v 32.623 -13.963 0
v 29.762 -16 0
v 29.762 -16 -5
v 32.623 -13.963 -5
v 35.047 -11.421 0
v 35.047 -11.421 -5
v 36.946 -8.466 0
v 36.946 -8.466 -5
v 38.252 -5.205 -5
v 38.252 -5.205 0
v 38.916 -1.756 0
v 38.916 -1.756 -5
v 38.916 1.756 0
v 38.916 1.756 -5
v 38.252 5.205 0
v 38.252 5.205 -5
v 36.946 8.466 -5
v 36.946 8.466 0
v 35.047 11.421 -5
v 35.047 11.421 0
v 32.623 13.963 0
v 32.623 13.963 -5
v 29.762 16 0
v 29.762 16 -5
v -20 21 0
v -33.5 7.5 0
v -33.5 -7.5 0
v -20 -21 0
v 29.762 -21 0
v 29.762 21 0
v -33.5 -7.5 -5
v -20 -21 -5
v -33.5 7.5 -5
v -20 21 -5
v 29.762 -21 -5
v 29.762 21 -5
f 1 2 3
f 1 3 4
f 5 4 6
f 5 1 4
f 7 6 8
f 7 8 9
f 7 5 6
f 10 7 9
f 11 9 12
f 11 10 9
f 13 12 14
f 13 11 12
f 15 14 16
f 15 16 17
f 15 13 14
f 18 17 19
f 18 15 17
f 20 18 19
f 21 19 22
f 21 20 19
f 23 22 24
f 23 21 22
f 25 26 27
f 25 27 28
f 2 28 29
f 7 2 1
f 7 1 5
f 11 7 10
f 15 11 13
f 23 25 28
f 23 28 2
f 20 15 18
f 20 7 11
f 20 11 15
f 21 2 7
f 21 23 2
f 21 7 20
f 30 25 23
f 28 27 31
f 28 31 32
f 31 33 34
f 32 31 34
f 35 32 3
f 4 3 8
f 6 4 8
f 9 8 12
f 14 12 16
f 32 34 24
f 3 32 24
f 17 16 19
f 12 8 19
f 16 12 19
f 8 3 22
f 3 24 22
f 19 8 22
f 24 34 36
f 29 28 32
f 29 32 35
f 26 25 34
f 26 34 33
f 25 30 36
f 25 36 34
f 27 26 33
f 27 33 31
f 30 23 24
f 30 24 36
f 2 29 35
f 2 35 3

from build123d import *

# Parameters (mm, degrees)
SM_BASE_FLANGE_1_DEPTH = 5


# Sheet-metal steps are written as plain solids
with BuildPart() as part:
    # Sketch 1 → Базовая кромка1 (new body)
    with BuildSketch(Plane.XY):
        with BuildLine():
            Line((29.76239566, 16.000000043), (29.76239566, 21.000000043))
            Line((29.76239566, 21.000000043), (-20, 21.000000043))
            Line((-20, 21.000000043), (-33.500000043, 7.5))
            Line((-33.500000043, 7.5), (-33.500000043, -7.5))
            Line((-33.500000043, -7.5), (-20, -21.000000043))
            Line((-20, -21.000000043), (29.76239566, -21.000000043))
            Line((29.76239566, -21.000000043), (29.76239566, -16.000000043))
            ThreePointArc((29.76239566, -16.000000043), (39.00000001, -1.1e-08), (29.76239566, 16.000000043))
        make_face()
    extrude(amount=-SM_BASE_FLANGE_1_DEPTH)


solid = part.part
